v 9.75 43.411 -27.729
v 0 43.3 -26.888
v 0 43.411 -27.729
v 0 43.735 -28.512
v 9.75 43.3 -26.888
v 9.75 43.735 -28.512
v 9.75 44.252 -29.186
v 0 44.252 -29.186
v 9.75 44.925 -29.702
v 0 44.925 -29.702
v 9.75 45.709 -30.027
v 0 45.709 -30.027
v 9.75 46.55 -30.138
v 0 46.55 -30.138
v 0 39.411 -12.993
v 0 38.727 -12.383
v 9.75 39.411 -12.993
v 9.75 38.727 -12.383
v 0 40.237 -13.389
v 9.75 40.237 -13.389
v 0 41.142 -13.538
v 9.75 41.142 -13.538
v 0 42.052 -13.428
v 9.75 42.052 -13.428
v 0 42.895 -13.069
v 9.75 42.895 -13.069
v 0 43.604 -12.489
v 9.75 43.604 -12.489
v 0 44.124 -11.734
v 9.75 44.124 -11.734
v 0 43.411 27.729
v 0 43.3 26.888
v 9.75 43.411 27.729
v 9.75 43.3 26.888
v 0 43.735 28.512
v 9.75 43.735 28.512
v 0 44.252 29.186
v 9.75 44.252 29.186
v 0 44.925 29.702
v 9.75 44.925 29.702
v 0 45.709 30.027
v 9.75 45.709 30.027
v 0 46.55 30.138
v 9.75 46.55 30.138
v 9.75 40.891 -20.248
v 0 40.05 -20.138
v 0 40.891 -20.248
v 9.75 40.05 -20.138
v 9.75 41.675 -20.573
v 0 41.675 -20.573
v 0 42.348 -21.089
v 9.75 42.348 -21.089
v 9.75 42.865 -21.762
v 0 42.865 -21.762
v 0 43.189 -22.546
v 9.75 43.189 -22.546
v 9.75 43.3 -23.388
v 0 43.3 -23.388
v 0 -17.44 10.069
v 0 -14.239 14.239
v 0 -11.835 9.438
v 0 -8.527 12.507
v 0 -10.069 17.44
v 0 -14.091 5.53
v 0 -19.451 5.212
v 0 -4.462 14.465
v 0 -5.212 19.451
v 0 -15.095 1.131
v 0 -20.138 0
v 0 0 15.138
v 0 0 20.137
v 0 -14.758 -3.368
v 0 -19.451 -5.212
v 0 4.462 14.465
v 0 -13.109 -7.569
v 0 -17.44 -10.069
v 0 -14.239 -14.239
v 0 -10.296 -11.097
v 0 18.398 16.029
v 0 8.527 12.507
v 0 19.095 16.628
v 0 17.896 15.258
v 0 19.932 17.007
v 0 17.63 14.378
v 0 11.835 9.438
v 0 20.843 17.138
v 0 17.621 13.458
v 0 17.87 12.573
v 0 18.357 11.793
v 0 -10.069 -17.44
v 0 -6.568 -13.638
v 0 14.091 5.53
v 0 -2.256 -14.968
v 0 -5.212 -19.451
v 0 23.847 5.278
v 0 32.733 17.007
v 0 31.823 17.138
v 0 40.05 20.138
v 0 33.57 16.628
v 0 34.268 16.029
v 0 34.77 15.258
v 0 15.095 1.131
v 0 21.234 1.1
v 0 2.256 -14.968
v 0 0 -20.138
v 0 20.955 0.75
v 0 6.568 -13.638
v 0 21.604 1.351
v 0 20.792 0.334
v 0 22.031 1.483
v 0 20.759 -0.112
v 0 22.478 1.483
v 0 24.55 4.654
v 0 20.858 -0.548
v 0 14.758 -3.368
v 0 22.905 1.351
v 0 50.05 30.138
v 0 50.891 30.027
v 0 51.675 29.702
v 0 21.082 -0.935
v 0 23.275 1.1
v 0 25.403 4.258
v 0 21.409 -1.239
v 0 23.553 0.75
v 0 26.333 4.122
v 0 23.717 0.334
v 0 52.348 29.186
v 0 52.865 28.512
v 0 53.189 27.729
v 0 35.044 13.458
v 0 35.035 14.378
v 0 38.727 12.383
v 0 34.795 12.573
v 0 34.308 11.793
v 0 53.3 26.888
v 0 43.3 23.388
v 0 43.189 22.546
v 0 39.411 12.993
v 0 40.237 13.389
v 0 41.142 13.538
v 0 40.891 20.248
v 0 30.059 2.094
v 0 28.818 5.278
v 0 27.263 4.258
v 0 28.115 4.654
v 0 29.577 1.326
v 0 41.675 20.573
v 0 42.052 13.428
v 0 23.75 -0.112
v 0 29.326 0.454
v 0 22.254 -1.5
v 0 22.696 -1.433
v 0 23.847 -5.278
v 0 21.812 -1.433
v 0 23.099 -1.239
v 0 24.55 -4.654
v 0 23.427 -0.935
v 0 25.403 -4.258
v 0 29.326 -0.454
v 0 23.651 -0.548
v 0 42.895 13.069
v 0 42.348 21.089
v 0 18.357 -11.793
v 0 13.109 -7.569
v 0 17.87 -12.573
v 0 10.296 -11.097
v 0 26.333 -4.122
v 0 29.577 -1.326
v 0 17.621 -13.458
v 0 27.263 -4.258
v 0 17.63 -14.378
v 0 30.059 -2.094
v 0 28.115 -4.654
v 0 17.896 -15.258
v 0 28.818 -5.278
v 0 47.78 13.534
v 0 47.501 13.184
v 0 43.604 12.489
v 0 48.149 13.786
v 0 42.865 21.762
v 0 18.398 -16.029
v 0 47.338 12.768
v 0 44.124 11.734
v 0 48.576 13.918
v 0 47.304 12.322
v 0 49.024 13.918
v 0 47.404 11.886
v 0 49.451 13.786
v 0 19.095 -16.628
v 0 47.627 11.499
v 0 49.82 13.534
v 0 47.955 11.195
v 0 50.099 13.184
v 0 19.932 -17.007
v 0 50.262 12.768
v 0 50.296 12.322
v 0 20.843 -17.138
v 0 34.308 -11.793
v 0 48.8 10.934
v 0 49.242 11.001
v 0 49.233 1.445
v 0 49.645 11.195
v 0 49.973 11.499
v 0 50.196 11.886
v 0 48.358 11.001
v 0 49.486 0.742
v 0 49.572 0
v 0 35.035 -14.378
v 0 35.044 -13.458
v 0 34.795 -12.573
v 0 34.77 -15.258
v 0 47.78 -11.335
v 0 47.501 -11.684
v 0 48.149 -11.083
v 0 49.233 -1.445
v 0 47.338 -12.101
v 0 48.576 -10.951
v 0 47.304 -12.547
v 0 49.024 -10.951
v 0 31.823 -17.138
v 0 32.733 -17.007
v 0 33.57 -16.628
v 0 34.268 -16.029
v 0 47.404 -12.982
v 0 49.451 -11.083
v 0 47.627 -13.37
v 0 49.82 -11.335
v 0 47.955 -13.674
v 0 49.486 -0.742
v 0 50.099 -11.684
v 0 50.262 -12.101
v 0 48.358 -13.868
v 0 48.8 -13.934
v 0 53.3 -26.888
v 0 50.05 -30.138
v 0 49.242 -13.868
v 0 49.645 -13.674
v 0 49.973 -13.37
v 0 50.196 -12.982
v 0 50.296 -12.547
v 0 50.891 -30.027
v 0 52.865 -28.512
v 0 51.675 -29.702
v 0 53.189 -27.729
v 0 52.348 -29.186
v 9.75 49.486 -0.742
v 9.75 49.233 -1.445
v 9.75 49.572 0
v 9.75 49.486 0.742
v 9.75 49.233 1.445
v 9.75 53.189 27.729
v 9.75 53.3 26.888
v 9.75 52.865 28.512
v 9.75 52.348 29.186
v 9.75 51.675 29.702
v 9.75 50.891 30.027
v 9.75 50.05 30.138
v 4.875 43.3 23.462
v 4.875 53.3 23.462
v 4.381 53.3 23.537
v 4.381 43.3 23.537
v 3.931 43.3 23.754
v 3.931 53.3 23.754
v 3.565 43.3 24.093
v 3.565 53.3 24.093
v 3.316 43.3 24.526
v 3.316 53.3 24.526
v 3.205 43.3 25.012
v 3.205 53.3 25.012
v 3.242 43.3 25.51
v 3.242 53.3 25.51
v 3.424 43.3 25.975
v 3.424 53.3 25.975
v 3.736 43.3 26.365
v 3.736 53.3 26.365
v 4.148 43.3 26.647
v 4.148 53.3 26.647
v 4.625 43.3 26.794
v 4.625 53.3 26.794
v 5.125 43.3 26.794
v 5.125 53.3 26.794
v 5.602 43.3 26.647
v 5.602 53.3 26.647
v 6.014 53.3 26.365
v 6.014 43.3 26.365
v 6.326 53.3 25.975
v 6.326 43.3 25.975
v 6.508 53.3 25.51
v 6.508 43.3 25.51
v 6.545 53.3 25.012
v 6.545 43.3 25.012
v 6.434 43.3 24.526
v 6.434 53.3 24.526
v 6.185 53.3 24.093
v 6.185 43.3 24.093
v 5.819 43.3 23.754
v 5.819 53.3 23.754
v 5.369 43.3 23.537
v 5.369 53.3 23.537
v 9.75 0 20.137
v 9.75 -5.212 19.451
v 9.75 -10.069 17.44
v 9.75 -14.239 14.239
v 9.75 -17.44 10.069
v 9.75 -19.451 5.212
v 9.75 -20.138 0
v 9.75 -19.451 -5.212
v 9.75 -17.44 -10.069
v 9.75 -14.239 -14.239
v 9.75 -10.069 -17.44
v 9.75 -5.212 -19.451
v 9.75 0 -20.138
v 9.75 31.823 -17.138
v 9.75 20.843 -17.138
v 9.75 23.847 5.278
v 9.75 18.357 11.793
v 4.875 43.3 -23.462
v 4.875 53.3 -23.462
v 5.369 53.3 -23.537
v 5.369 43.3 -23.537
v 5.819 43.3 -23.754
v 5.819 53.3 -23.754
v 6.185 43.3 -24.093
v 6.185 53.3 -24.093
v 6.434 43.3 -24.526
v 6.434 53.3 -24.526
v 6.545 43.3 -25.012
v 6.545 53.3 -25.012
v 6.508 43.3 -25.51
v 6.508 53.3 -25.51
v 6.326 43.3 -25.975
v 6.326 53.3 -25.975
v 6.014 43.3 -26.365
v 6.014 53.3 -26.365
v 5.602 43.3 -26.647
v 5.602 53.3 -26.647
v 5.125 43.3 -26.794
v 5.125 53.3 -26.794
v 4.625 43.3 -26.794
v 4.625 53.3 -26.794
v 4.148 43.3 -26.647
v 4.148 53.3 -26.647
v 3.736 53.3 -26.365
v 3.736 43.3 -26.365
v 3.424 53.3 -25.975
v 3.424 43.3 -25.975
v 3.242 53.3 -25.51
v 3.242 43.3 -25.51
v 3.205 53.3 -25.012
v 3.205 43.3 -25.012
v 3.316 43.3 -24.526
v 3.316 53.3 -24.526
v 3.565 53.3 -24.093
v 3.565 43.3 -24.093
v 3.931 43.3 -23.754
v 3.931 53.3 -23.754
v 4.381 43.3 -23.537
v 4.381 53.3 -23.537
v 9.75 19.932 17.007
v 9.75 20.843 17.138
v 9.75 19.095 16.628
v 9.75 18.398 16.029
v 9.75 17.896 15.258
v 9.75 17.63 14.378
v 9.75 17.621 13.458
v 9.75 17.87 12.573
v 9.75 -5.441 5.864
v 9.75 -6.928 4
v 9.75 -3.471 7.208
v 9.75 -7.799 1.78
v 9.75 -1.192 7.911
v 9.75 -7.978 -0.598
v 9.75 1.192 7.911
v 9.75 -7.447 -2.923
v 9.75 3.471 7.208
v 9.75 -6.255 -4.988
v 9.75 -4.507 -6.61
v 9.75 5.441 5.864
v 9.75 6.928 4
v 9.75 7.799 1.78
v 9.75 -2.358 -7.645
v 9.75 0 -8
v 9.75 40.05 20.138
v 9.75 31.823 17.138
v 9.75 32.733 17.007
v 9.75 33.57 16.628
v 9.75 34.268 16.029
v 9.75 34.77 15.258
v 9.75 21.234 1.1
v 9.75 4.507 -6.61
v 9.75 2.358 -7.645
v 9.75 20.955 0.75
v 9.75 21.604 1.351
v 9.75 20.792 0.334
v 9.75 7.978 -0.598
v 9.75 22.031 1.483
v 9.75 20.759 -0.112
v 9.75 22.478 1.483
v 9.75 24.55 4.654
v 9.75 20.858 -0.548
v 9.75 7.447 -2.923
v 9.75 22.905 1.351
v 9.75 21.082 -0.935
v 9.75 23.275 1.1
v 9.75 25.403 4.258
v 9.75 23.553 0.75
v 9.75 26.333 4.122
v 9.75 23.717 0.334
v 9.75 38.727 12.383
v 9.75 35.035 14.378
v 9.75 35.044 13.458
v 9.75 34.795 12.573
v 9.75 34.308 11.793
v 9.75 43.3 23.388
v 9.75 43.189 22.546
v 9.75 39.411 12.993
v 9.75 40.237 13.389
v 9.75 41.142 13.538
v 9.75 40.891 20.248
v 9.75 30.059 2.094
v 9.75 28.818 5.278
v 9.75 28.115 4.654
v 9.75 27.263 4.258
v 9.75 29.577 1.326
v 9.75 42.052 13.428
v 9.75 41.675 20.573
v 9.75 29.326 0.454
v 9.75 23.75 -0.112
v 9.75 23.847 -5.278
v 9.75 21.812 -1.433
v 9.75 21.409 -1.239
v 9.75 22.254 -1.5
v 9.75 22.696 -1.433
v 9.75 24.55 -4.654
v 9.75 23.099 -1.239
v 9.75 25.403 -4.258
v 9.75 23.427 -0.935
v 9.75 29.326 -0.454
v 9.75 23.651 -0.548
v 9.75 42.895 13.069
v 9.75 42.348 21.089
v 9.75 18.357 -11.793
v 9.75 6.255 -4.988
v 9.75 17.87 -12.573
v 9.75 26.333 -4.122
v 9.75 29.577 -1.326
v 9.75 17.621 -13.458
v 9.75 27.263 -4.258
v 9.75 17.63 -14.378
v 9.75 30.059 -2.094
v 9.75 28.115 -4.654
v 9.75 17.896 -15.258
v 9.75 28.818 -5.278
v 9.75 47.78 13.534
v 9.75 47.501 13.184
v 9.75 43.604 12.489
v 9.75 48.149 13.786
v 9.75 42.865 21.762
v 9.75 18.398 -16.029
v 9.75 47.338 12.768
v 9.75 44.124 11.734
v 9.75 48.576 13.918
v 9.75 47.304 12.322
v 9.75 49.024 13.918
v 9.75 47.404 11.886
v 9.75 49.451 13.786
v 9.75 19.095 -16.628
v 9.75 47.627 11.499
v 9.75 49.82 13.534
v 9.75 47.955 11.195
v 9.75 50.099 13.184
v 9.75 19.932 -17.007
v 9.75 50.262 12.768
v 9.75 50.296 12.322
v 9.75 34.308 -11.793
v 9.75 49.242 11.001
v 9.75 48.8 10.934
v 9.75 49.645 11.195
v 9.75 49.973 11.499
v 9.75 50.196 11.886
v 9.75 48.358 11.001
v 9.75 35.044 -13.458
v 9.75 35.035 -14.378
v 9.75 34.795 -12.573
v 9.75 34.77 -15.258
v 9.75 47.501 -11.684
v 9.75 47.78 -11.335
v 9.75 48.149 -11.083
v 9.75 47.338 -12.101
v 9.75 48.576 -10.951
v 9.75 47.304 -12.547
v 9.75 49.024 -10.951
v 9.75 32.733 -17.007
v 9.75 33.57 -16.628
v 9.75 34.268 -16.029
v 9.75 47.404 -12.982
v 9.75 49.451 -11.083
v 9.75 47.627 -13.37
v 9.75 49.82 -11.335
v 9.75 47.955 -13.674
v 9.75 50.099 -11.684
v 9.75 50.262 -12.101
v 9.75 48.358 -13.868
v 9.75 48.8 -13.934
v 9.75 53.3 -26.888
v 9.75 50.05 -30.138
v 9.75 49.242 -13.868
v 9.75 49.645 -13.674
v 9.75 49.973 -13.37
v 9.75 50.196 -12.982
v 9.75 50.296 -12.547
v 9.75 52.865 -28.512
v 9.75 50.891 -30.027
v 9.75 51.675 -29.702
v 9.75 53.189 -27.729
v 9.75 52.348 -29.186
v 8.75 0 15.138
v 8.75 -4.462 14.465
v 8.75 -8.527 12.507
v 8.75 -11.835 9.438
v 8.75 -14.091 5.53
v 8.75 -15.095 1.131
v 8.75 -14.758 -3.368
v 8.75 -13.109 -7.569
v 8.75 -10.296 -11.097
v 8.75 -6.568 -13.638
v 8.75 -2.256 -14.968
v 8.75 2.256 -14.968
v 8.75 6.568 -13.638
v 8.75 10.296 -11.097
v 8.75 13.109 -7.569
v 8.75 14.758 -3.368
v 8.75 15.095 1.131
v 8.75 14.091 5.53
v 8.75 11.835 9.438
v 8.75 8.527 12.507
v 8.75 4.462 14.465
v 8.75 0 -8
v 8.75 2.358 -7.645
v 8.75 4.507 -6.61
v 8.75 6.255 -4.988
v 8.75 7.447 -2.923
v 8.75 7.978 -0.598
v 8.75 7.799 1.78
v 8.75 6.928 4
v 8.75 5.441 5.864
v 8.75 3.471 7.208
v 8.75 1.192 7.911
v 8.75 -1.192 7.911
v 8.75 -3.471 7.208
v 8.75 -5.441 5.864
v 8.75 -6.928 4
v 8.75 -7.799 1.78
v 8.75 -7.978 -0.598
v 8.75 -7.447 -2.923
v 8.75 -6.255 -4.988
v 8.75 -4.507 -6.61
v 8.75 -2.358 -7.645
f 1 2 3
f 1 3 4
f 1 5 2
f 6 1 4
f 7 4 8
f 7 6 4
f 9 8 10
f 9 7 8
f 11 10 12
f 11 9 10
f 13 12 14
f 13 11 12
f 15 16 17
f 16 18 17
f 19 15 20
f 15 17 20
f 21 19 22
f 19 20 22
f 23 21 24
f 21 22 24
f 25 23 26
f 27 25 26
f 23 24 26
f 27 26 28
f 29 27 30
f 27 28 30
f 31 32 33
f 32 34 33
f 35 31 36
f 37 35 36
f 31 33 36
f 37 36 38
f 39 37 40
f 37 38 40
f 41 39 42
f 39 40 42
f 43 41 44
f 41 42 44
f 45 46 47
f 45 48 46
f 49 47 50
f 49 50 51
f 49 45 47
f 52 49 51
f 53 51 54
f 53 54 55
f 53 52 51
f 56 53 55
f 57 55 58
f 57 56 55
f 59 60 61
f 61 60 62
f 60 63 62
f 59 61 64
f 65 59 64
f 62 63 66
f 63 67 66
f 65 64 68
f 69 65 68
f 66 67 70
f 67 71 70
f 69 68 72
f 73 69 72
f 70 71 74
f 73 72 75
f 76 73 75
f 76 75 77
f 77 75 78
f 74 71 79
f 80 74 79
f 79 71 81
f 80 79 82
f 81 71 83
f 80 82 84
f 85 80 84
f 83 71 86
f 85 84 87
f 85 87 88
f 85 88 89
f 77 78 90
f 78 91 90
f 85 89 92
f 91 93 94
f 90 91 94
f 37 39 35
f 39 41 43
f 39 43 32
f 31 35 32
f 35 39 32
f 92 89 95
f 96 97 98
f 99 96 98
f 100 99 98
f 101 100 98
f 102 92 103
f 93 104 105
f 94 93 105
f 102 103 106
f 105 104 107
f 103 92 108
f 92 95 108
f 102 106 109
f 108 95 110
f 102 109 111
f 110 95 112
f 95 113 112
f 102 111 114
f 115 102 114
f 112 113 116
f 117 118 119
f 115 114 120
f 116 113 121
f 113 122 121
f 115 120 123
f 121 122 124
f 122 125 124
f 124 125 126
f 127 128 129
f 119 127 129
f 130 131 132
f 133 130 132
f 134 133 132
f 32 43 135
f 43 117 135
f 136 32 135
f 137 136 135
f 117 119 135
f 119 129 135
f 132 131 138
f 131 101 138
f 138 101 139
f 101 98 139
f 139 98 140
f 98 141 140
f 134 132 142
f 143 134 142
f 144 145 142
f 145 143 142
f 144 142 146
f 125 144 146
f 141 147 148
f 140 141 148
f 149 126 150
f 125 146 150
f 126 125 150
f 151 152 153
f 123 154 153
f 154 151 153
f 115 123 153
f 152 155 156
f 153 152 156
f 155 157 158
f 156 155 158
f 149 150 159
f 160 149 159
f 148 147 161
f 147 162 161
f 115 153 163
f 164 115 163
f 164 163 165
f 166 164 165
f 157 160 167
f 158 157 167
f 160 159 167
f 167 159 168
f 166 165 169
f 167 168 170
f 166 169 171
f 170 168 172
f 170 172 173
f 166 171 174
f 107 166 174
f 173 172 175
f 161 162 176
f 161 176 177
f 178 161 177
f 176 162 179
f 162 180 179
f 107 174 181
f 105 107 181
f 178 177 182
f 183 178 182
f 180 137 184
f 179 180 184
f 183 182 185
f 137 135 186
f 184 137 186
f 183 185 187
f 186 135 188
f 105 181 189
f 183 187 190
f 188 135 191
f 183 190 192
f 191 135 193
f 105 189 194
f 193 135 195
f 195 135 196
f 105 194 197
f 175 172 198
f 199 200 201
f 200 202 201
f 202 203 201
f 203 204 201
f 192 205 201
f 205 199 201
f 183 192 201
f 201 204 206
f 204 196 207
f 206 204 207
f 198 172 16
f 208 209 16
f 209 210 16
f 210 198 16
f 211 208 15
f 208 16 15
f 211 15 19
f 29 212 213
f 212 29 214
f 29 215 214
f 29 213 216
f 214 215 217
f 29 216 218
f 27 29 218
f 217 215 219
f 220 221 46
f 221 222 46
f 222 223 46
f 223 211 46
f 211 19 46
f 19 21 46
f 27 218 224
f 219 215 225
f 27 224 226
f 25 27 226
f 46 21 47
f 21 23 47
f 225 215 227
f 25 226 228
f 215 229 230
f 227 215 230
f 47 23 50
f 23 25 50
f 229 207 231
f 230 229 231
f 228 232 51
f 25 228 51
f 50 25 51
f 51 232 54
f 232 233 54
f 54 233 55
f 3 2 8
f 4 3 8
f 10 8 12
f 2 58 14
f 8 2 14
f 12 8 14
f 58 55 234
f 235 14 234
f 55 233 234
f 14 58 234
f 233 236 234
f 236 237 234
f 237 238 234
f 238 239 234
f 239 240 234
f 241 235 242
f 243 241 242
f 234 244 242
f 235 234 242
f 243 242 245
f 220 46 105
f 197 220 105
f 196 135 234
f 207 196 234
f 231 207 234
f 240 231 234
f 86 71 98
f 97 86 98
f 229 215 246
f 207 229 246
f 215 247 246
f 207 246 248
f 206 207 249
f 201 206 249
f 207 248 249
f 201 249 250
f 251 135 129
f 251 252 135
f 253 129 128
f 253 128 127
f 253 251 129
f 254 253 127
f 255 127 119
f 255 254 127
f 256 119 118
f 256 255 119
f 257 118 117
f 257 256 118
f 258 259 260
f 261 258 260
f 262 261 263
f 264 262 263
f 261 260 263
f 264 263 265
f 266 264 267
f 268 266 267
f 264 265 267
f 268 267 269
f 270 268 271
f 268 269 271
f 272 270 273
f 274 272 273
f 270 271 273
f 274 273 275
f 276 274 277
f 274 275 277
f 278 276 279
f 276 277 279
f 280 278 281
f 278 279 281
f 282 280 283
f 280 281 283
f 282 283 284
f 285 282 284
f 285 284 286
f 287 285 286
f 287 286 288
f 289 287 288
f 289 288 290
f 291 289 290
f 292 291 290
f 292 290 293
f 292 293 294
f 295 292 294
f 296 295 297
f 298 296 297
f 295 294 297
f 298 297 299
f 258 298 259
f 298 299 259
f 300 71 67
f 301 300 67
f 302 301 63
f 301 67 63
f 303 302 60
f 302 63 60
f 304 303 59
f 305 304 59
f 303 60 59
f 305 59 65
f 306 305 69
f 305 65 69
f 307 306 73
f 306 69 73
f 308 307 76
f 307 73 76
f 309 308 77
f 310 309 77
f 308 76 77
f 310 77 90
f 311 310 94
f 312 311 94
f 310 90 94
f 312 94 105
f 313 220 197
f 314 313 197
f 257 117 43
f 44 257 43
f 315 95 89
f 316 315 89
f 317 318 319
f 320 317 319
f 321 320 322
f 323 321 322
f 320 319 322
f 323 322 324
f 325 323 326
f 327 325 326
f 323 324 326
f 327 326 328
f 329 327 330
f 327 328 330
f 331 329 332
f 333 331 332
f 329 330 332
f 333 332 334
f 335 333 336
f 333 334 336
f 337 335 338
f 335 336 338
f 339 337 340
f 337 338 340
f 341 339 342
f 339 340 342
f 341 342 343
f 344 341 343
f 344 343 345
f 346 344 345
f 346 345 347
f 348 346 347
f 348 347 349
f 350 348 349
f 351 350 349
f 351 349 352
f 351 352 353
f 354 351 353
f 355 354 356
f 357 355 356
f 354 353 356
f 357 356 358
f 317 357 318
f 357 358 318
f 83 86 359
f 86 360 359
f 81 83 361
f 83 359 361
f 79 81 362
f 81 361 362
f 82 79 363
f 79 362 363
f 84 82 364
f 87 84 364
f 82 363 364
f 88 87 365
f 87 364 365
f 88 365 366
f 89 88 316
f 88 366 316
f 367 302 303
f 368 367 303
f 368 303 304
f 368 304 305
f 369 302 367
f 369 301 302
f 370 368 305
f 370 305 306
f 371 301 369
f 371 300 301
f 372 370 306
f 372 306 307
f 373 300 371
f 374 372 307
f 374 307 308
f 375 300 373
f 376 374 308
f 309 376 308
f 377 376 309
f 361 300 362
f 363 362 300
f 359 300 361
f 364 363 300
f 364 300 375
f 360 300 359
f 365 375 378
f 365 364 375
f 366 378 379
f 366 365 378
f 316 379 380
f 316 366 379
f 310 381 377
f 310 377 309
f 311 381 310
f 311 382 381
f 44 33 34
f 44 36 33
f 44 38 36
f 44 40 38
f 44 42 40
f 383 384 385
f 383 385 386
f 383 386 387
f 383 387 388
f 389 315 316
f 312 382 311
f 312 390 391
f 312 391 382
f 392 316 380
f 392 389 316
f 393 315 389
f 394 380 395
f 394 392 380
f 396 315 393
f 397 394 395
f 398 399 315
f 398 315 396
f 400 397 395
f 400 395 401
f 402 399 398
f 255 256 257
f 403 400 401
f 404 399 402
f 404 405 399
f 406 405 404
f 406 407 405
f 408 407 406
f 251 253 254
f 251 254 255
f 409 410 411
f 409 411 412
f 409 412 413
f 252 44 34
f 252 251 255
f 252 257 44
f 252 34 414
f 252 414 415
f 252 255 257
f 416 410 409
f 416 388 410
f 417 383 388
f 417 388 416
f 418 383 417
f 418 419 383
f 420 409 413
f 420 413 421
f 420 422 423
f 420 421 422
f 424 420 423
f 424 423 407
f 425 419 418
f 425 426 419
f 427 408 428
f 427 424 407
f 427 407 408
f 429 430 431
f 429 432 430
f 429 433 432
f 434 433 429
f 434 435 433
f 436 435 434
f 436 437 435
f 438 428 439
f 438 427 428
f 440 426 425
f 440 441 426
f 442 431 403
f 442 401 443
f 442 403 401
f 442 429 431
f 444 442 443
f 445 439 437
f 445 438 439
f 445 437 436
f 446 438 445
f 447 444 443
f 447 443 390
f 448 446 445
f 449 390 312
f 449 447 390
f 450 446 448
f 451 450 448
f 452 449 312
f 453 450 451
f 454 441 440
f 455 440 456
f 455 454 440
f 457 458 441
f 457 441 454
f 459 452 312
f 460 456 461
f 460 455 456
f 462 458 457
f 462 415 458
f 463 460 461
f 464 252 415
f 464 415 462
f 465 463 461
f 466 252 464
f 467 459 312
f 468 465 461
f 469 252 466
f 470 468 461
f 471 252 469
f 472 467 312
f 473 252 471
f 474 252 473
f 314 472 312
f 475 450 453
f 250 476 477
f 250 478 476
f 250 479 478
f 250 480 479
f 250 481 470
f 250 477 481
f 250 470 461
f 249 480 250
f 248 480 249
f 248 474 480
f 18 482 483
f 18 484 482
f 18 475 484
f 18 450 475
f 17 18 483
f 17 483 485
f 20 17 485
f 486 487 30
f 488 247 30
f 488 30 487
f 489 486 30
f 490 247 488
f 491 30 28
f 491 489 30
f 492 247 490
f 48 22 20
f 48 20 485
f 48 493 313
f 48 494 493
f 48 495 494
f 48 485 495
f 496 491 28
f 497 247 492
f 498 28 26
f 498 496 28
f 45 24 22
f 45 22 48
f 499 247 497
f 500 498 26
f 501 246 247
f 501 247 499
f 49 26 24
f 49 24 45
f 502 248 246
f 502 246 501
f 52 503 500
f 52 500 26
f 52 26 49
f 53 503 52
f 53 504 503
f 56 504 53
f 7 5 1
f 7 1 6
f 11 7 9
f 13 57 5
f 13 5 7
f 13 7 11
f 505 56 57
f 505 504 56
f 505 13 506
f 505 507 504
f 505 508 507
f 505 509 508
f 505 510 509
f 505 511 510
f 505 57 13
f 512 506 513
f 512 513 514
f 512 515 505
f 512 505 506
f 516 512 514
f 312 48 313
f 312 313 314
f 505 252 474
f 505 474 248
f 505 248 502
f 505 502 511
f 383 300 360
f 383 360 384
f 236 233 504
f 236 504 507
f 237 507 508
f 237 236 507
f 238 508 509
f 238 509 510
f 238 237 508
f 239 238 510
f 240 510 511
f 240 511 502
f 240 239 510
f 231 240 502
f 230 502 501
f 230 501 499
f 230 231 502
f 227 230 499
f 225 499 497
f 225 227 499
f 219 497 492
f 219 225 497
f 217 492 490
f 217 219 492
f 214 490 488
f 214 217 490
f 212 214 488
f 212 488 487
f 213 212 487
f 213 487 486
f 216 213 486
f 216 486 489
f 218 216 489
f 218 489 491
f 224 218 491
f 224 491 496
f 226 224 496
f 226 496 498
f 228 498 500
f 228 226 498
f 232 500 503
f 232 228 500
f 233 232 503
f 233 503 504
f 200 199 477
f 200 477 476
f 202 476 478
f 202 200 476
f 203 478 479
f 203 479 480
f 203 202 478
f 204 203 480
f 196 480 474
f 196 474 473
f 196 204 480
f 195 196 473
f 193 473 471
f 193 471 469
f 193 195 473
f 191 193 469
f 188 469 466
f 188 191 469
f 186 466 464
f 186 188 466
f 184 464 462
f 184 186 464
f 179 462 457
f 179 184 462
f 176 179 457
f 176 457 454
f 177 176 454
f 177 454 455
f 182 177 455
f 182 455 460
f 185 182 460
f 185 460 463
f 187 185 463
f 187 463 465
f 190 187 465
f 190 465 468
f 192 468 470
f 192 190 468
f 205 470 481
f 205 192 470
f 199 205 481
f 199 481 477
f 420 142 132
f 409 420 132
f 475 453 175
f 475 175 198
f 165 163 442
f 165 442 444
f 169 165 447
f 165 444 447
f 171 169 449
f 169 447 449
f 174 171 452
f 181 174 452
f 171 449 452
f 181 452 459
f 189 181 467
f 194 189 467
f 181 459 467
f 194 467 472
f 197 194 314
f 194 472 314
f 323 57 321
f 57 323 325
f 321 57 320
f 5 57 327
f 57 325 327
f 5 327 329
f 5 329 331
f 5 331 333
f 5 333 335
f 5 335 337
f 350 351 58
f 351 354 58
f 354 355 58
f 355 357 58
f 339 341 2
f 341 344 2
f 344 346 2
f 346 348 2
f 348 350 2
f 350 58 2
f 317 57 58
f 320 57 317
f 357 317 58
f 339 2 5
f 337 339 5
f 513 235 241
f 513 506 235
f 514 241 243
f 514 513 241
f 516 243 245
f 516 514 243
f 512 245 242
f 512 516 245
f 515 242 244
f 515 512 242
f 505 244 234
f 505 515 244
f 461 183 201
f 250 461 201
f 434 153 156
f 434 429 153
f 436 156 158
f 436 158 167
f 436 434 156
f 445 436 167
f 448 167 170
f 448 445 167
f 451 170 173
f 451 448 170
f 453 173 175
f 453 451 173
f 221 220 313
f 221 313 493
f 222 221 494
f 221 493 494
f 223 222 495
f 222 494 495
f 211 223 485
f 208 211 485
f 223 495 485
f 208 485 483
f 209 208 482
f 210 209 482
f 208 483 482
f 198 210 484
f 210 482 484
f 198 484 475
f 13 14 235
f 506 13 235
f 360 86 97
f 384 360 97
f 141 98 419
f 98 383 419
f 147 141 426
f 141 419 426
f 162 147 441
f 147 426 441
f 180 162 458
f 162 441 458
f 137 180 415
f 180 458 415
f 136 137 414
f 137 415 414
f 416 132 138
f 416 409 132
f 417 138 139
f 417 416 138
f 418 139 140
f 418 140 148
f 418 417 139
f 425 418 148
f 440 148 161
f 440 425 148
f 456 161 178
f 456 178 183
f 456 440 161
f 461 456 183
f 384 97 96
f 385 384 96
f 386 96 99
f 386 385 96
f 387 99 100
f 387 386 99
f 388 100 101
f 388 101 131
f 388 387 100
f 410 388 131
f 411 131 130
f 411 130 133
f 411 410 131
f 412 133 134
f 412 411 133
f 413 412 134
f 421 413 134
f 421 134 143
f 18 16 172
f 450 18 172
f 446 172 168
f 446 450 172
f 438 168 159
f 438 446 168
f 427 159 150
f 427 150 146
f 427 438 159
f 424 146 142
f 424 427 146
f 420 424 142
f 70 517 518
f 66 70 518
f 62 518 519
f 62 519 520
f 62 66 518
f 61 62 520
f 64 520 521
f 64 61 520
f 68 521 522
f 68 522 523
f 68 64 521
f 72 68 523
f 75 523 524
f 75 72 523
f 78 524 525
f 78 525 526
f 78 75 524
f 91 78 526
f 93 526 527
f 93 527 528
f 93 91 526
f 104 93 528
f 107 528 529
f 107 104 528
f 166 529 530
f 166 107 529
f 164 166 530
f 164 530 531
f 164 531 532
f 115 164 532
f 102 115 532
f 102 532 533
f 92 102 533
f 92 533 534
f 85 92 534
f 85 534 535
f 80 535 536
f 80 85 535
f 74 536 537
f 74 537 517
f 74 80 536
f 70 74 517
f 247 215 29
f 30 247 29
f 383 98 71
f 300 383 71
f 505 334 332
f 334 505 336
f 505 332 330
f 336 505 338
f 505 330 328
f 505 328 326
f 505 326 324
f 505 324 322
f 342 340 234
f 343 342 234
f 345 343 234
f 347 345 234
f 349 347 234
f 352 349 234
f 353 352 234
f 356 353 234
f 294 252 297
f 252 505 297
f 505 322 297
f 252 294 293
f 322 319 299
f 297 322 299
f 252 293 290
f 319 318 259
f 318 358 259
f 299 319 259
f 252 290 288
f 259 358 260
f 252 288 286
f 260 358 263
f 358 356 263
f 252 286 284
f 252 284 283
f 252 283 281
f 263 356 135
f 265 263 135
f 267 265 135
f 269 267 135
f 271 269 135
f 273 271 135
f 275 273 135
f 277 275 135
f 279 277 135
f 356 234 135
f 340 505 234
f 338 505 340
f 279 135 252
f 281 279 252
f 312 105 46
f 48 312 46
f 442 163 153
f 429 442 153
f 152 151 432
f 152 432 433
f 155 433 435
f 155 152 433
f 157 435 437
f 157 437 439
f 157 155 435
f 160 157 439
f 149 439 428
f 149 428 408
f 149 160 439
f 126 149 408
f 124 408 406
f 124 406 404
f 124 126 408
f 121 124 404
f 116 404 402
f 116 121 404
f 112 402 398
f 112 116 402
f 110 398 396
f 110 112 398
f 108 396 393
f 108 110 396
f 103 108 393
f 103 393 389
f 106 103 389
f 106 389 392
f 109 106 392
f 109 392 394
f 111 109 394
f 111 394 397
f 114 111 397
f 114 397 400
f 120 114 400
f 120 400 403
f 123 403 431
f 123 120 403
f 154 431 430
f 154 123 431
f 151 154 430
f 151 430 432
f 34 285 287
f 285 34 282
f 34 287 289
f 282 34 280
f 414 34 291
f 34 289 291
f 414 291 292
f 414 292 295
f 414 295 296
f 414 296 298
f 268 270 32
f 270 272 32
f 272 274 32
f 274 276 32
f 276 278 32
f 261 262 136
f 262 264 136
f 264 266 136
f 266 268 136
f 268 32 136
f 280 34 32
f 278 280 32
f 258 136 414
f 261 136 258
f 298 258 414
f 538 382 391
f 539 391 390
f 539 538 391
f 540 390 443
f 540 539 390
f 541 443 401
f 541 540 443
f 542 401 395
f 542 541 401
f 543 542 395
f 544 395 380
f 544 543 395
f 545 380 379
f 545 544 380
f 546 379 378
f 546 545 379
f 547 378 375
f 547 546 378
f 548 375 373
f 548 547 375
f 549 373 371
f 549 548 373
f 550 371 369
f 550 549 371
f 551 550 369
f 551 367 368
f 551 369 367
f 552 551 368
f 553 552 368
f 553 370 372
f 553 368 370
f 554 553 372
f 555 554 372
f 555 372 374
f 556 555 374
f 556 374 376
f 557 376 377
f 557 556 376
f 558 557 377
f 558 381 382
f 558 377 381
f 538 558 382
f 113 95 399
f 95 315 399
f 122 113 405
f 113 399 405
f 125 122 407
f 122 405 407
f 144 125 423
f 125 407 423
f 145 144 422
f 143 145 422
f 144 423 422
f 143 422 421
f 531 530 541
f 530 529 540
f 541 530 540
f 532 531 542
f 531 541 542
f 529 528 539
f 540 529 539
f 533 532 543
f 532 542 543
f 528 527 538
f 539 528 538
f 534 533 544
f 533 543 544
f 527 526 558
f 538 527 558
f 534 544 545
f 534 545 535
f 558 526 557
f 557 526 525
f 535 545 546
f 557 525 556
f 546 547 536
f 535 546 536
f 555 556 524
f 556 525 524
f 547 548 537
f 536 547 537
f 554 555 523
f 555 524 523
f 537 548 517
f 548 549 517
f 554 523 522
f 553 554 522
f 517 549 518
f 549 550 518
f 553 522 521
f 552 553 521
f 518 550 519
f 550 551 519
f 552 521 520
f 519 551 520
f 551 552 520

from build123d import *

# Parameters (mm, degrees)
SKETCH1_R           = 1.5
BOSS_EXTRUDE1_DEPTH = 9.75
SKETCH3_R           = 1.675
CUT_EXTRUDE1_DEPTH  = 10
CUT_EXTRUDE2_REACH  = 64.002
SKETCH1_4_R         = 8
FILLET1_R           = 3.25
SKETCH1_5_R         = 15.1375
SKETCH1_5_R_2       = 8
CUT_EXTRUDE3_DEPTH  = 8.75


with BuildPart() as part:
    # Sketch1 → Boss-Extrude1 (new body)
    with BuildSketch(Plane(origin=(0, 0, 0), x_dir=(0, 0, -1), z_dir=(1, 0, 0))):
        with BuildLine():
            Line((20.1375, 0), (20.1375, 43.3))
            Line((20.1375, 43.3), (30.1375, 43.3))
            Line((30.1375, 43.3), (30.1375, 53.3))
            Line((30.1375, 53.3), (-30.1375, 53.3))
            Line((-30.1375, 53.3), (-30.1375, 43.3))
            Line((-30.1375, 43.3), (-20.1375, 43.3))
            Line((-20.1375, 43.3), (-20.1375, 0))
            ThreePointArc((-20.1375, 0), (0, -20.1375), (20.1375, 0))
        make_face()
        Polygon((-17.1375, 38.810813136), (-2.327943822, 26.332666354), (-17.1375, 13.854519572), align=None, mode=Mode.SUBTRACT)
        with Locations((-12.43443714, 48.8)):
            Circle(SKETCH1_R, mode=Mode.SUBTRACT)
        with Locations((0, 22.254350724)):
            Circle(SKETCH1_R, mode=Mode.SUBTRACT)
        Polygon((2.327943822, 26.332666354), (17.1375, 38.810813136), (17.1375, 13.854519572), align=None, mode=Mode.SUBTRACT)
        Polygon((0, 28.294131259), (-16.171581688, 41.919885304), (0, 49.950465907), (16.171581688, 41.919885304), align=None, mode=Mode.SUBTRACT)
        with Locations((12.43443714, 48.8)):
            Circle(SKETCH1_R, mode=Mode.SUBTRACT)
    extrude(amount=BOSS_EXTRUDE1_DEPTH)

    # Sketch3 → Cut-Extrude1 (cut)
    with BuildSketch(Plane(origin=(0, 53.3, 0), x_dir=(1, 0, 0), z_dir=(0, 1, 0))):
        with Locations(Location((4.875, 25.1375, 0), (0, 0, 270))):
            Circle(SKETCH3_R)
        with Locations(Location((4.875, -25.1375, 0), (0, 0, 90))):
            Circle(SKETCH3_R)
    extrude(amount=-CUT_EXTRUDE1_DEPTH, mode=Mode.SUBTRACT)

    # Sketch1<4> → Cut-Extrude2 (cut, up to next)
    with BuildSketch(Plane(origin=(0, 0, 0), x_dir=(0, 0, -1), z_dir=(1, 0, 0)), mode=Mode.PRIVATE) as cut_extrude2_sk1:
        Circle(SKETCH1_4_R)
    cut_extrude2_tool1 = extrude(cut_extrude2_sk1.sketch, amount=CUT_EXTRUDE2_REACH, mode=Mode.PRIVATE) & part.part
    add(cut_extrude2_tool1.solids().sort_by_distance((0, 0, 0))[0], mode=Mode.SUBTRACT)

    # Fillet1
    fillet1_edges = [part.edges().sort_by_distance(p)[0] for p in [
        (4.875, 41.919885304, -16.171581688),
        (4.875, 49.950465907, 0),
        (4.875, 41.919885304, 16.171581688),
        (4.875, 28.294131259, 0),
        (4.875, 38.810813136, 17.1375),
        (4.875, 13.854519572, 17.1375),
        (4.875, 26.332666354, 2.327943822),
        (4.875, 53.3, -30.1375),
        (4.875, 43.3, -30.1375),
        (4.875, 43.3, -20.1375),
        (4.875, 43.3, 20.1375),
        (4.875, 43.3, 30.1375),
        (4.875, 53.3, 30.1375),
        (4.875, 13.854519572, -17.1375),
        (4.875, 38.810813136, -17.1375),
        (4.875, 26.332666354, -2.327943822),
    ]]
    fillet(fillet1_edges, radius=FILLET1_R)

    # Sketch1<5> → Cut-Extrude3 (cut)
    with BuildSketch(Plane(origin=(0, 0, 0), x_dir=(0, 0, -1), z_dir=(1, 0, 0))):
        with Locations(Location((0, 0, 0), (0, 0, 180))):
            Circle(SKETCH1_5_R)
        Circle(SKETCH1_5_R_2, mode=Mode.SUBTRACT)
    extrude(amount=CUT_EXTRUDE3_DEPTH, mode=Mode.SUBTRACT)


solid = part.part
